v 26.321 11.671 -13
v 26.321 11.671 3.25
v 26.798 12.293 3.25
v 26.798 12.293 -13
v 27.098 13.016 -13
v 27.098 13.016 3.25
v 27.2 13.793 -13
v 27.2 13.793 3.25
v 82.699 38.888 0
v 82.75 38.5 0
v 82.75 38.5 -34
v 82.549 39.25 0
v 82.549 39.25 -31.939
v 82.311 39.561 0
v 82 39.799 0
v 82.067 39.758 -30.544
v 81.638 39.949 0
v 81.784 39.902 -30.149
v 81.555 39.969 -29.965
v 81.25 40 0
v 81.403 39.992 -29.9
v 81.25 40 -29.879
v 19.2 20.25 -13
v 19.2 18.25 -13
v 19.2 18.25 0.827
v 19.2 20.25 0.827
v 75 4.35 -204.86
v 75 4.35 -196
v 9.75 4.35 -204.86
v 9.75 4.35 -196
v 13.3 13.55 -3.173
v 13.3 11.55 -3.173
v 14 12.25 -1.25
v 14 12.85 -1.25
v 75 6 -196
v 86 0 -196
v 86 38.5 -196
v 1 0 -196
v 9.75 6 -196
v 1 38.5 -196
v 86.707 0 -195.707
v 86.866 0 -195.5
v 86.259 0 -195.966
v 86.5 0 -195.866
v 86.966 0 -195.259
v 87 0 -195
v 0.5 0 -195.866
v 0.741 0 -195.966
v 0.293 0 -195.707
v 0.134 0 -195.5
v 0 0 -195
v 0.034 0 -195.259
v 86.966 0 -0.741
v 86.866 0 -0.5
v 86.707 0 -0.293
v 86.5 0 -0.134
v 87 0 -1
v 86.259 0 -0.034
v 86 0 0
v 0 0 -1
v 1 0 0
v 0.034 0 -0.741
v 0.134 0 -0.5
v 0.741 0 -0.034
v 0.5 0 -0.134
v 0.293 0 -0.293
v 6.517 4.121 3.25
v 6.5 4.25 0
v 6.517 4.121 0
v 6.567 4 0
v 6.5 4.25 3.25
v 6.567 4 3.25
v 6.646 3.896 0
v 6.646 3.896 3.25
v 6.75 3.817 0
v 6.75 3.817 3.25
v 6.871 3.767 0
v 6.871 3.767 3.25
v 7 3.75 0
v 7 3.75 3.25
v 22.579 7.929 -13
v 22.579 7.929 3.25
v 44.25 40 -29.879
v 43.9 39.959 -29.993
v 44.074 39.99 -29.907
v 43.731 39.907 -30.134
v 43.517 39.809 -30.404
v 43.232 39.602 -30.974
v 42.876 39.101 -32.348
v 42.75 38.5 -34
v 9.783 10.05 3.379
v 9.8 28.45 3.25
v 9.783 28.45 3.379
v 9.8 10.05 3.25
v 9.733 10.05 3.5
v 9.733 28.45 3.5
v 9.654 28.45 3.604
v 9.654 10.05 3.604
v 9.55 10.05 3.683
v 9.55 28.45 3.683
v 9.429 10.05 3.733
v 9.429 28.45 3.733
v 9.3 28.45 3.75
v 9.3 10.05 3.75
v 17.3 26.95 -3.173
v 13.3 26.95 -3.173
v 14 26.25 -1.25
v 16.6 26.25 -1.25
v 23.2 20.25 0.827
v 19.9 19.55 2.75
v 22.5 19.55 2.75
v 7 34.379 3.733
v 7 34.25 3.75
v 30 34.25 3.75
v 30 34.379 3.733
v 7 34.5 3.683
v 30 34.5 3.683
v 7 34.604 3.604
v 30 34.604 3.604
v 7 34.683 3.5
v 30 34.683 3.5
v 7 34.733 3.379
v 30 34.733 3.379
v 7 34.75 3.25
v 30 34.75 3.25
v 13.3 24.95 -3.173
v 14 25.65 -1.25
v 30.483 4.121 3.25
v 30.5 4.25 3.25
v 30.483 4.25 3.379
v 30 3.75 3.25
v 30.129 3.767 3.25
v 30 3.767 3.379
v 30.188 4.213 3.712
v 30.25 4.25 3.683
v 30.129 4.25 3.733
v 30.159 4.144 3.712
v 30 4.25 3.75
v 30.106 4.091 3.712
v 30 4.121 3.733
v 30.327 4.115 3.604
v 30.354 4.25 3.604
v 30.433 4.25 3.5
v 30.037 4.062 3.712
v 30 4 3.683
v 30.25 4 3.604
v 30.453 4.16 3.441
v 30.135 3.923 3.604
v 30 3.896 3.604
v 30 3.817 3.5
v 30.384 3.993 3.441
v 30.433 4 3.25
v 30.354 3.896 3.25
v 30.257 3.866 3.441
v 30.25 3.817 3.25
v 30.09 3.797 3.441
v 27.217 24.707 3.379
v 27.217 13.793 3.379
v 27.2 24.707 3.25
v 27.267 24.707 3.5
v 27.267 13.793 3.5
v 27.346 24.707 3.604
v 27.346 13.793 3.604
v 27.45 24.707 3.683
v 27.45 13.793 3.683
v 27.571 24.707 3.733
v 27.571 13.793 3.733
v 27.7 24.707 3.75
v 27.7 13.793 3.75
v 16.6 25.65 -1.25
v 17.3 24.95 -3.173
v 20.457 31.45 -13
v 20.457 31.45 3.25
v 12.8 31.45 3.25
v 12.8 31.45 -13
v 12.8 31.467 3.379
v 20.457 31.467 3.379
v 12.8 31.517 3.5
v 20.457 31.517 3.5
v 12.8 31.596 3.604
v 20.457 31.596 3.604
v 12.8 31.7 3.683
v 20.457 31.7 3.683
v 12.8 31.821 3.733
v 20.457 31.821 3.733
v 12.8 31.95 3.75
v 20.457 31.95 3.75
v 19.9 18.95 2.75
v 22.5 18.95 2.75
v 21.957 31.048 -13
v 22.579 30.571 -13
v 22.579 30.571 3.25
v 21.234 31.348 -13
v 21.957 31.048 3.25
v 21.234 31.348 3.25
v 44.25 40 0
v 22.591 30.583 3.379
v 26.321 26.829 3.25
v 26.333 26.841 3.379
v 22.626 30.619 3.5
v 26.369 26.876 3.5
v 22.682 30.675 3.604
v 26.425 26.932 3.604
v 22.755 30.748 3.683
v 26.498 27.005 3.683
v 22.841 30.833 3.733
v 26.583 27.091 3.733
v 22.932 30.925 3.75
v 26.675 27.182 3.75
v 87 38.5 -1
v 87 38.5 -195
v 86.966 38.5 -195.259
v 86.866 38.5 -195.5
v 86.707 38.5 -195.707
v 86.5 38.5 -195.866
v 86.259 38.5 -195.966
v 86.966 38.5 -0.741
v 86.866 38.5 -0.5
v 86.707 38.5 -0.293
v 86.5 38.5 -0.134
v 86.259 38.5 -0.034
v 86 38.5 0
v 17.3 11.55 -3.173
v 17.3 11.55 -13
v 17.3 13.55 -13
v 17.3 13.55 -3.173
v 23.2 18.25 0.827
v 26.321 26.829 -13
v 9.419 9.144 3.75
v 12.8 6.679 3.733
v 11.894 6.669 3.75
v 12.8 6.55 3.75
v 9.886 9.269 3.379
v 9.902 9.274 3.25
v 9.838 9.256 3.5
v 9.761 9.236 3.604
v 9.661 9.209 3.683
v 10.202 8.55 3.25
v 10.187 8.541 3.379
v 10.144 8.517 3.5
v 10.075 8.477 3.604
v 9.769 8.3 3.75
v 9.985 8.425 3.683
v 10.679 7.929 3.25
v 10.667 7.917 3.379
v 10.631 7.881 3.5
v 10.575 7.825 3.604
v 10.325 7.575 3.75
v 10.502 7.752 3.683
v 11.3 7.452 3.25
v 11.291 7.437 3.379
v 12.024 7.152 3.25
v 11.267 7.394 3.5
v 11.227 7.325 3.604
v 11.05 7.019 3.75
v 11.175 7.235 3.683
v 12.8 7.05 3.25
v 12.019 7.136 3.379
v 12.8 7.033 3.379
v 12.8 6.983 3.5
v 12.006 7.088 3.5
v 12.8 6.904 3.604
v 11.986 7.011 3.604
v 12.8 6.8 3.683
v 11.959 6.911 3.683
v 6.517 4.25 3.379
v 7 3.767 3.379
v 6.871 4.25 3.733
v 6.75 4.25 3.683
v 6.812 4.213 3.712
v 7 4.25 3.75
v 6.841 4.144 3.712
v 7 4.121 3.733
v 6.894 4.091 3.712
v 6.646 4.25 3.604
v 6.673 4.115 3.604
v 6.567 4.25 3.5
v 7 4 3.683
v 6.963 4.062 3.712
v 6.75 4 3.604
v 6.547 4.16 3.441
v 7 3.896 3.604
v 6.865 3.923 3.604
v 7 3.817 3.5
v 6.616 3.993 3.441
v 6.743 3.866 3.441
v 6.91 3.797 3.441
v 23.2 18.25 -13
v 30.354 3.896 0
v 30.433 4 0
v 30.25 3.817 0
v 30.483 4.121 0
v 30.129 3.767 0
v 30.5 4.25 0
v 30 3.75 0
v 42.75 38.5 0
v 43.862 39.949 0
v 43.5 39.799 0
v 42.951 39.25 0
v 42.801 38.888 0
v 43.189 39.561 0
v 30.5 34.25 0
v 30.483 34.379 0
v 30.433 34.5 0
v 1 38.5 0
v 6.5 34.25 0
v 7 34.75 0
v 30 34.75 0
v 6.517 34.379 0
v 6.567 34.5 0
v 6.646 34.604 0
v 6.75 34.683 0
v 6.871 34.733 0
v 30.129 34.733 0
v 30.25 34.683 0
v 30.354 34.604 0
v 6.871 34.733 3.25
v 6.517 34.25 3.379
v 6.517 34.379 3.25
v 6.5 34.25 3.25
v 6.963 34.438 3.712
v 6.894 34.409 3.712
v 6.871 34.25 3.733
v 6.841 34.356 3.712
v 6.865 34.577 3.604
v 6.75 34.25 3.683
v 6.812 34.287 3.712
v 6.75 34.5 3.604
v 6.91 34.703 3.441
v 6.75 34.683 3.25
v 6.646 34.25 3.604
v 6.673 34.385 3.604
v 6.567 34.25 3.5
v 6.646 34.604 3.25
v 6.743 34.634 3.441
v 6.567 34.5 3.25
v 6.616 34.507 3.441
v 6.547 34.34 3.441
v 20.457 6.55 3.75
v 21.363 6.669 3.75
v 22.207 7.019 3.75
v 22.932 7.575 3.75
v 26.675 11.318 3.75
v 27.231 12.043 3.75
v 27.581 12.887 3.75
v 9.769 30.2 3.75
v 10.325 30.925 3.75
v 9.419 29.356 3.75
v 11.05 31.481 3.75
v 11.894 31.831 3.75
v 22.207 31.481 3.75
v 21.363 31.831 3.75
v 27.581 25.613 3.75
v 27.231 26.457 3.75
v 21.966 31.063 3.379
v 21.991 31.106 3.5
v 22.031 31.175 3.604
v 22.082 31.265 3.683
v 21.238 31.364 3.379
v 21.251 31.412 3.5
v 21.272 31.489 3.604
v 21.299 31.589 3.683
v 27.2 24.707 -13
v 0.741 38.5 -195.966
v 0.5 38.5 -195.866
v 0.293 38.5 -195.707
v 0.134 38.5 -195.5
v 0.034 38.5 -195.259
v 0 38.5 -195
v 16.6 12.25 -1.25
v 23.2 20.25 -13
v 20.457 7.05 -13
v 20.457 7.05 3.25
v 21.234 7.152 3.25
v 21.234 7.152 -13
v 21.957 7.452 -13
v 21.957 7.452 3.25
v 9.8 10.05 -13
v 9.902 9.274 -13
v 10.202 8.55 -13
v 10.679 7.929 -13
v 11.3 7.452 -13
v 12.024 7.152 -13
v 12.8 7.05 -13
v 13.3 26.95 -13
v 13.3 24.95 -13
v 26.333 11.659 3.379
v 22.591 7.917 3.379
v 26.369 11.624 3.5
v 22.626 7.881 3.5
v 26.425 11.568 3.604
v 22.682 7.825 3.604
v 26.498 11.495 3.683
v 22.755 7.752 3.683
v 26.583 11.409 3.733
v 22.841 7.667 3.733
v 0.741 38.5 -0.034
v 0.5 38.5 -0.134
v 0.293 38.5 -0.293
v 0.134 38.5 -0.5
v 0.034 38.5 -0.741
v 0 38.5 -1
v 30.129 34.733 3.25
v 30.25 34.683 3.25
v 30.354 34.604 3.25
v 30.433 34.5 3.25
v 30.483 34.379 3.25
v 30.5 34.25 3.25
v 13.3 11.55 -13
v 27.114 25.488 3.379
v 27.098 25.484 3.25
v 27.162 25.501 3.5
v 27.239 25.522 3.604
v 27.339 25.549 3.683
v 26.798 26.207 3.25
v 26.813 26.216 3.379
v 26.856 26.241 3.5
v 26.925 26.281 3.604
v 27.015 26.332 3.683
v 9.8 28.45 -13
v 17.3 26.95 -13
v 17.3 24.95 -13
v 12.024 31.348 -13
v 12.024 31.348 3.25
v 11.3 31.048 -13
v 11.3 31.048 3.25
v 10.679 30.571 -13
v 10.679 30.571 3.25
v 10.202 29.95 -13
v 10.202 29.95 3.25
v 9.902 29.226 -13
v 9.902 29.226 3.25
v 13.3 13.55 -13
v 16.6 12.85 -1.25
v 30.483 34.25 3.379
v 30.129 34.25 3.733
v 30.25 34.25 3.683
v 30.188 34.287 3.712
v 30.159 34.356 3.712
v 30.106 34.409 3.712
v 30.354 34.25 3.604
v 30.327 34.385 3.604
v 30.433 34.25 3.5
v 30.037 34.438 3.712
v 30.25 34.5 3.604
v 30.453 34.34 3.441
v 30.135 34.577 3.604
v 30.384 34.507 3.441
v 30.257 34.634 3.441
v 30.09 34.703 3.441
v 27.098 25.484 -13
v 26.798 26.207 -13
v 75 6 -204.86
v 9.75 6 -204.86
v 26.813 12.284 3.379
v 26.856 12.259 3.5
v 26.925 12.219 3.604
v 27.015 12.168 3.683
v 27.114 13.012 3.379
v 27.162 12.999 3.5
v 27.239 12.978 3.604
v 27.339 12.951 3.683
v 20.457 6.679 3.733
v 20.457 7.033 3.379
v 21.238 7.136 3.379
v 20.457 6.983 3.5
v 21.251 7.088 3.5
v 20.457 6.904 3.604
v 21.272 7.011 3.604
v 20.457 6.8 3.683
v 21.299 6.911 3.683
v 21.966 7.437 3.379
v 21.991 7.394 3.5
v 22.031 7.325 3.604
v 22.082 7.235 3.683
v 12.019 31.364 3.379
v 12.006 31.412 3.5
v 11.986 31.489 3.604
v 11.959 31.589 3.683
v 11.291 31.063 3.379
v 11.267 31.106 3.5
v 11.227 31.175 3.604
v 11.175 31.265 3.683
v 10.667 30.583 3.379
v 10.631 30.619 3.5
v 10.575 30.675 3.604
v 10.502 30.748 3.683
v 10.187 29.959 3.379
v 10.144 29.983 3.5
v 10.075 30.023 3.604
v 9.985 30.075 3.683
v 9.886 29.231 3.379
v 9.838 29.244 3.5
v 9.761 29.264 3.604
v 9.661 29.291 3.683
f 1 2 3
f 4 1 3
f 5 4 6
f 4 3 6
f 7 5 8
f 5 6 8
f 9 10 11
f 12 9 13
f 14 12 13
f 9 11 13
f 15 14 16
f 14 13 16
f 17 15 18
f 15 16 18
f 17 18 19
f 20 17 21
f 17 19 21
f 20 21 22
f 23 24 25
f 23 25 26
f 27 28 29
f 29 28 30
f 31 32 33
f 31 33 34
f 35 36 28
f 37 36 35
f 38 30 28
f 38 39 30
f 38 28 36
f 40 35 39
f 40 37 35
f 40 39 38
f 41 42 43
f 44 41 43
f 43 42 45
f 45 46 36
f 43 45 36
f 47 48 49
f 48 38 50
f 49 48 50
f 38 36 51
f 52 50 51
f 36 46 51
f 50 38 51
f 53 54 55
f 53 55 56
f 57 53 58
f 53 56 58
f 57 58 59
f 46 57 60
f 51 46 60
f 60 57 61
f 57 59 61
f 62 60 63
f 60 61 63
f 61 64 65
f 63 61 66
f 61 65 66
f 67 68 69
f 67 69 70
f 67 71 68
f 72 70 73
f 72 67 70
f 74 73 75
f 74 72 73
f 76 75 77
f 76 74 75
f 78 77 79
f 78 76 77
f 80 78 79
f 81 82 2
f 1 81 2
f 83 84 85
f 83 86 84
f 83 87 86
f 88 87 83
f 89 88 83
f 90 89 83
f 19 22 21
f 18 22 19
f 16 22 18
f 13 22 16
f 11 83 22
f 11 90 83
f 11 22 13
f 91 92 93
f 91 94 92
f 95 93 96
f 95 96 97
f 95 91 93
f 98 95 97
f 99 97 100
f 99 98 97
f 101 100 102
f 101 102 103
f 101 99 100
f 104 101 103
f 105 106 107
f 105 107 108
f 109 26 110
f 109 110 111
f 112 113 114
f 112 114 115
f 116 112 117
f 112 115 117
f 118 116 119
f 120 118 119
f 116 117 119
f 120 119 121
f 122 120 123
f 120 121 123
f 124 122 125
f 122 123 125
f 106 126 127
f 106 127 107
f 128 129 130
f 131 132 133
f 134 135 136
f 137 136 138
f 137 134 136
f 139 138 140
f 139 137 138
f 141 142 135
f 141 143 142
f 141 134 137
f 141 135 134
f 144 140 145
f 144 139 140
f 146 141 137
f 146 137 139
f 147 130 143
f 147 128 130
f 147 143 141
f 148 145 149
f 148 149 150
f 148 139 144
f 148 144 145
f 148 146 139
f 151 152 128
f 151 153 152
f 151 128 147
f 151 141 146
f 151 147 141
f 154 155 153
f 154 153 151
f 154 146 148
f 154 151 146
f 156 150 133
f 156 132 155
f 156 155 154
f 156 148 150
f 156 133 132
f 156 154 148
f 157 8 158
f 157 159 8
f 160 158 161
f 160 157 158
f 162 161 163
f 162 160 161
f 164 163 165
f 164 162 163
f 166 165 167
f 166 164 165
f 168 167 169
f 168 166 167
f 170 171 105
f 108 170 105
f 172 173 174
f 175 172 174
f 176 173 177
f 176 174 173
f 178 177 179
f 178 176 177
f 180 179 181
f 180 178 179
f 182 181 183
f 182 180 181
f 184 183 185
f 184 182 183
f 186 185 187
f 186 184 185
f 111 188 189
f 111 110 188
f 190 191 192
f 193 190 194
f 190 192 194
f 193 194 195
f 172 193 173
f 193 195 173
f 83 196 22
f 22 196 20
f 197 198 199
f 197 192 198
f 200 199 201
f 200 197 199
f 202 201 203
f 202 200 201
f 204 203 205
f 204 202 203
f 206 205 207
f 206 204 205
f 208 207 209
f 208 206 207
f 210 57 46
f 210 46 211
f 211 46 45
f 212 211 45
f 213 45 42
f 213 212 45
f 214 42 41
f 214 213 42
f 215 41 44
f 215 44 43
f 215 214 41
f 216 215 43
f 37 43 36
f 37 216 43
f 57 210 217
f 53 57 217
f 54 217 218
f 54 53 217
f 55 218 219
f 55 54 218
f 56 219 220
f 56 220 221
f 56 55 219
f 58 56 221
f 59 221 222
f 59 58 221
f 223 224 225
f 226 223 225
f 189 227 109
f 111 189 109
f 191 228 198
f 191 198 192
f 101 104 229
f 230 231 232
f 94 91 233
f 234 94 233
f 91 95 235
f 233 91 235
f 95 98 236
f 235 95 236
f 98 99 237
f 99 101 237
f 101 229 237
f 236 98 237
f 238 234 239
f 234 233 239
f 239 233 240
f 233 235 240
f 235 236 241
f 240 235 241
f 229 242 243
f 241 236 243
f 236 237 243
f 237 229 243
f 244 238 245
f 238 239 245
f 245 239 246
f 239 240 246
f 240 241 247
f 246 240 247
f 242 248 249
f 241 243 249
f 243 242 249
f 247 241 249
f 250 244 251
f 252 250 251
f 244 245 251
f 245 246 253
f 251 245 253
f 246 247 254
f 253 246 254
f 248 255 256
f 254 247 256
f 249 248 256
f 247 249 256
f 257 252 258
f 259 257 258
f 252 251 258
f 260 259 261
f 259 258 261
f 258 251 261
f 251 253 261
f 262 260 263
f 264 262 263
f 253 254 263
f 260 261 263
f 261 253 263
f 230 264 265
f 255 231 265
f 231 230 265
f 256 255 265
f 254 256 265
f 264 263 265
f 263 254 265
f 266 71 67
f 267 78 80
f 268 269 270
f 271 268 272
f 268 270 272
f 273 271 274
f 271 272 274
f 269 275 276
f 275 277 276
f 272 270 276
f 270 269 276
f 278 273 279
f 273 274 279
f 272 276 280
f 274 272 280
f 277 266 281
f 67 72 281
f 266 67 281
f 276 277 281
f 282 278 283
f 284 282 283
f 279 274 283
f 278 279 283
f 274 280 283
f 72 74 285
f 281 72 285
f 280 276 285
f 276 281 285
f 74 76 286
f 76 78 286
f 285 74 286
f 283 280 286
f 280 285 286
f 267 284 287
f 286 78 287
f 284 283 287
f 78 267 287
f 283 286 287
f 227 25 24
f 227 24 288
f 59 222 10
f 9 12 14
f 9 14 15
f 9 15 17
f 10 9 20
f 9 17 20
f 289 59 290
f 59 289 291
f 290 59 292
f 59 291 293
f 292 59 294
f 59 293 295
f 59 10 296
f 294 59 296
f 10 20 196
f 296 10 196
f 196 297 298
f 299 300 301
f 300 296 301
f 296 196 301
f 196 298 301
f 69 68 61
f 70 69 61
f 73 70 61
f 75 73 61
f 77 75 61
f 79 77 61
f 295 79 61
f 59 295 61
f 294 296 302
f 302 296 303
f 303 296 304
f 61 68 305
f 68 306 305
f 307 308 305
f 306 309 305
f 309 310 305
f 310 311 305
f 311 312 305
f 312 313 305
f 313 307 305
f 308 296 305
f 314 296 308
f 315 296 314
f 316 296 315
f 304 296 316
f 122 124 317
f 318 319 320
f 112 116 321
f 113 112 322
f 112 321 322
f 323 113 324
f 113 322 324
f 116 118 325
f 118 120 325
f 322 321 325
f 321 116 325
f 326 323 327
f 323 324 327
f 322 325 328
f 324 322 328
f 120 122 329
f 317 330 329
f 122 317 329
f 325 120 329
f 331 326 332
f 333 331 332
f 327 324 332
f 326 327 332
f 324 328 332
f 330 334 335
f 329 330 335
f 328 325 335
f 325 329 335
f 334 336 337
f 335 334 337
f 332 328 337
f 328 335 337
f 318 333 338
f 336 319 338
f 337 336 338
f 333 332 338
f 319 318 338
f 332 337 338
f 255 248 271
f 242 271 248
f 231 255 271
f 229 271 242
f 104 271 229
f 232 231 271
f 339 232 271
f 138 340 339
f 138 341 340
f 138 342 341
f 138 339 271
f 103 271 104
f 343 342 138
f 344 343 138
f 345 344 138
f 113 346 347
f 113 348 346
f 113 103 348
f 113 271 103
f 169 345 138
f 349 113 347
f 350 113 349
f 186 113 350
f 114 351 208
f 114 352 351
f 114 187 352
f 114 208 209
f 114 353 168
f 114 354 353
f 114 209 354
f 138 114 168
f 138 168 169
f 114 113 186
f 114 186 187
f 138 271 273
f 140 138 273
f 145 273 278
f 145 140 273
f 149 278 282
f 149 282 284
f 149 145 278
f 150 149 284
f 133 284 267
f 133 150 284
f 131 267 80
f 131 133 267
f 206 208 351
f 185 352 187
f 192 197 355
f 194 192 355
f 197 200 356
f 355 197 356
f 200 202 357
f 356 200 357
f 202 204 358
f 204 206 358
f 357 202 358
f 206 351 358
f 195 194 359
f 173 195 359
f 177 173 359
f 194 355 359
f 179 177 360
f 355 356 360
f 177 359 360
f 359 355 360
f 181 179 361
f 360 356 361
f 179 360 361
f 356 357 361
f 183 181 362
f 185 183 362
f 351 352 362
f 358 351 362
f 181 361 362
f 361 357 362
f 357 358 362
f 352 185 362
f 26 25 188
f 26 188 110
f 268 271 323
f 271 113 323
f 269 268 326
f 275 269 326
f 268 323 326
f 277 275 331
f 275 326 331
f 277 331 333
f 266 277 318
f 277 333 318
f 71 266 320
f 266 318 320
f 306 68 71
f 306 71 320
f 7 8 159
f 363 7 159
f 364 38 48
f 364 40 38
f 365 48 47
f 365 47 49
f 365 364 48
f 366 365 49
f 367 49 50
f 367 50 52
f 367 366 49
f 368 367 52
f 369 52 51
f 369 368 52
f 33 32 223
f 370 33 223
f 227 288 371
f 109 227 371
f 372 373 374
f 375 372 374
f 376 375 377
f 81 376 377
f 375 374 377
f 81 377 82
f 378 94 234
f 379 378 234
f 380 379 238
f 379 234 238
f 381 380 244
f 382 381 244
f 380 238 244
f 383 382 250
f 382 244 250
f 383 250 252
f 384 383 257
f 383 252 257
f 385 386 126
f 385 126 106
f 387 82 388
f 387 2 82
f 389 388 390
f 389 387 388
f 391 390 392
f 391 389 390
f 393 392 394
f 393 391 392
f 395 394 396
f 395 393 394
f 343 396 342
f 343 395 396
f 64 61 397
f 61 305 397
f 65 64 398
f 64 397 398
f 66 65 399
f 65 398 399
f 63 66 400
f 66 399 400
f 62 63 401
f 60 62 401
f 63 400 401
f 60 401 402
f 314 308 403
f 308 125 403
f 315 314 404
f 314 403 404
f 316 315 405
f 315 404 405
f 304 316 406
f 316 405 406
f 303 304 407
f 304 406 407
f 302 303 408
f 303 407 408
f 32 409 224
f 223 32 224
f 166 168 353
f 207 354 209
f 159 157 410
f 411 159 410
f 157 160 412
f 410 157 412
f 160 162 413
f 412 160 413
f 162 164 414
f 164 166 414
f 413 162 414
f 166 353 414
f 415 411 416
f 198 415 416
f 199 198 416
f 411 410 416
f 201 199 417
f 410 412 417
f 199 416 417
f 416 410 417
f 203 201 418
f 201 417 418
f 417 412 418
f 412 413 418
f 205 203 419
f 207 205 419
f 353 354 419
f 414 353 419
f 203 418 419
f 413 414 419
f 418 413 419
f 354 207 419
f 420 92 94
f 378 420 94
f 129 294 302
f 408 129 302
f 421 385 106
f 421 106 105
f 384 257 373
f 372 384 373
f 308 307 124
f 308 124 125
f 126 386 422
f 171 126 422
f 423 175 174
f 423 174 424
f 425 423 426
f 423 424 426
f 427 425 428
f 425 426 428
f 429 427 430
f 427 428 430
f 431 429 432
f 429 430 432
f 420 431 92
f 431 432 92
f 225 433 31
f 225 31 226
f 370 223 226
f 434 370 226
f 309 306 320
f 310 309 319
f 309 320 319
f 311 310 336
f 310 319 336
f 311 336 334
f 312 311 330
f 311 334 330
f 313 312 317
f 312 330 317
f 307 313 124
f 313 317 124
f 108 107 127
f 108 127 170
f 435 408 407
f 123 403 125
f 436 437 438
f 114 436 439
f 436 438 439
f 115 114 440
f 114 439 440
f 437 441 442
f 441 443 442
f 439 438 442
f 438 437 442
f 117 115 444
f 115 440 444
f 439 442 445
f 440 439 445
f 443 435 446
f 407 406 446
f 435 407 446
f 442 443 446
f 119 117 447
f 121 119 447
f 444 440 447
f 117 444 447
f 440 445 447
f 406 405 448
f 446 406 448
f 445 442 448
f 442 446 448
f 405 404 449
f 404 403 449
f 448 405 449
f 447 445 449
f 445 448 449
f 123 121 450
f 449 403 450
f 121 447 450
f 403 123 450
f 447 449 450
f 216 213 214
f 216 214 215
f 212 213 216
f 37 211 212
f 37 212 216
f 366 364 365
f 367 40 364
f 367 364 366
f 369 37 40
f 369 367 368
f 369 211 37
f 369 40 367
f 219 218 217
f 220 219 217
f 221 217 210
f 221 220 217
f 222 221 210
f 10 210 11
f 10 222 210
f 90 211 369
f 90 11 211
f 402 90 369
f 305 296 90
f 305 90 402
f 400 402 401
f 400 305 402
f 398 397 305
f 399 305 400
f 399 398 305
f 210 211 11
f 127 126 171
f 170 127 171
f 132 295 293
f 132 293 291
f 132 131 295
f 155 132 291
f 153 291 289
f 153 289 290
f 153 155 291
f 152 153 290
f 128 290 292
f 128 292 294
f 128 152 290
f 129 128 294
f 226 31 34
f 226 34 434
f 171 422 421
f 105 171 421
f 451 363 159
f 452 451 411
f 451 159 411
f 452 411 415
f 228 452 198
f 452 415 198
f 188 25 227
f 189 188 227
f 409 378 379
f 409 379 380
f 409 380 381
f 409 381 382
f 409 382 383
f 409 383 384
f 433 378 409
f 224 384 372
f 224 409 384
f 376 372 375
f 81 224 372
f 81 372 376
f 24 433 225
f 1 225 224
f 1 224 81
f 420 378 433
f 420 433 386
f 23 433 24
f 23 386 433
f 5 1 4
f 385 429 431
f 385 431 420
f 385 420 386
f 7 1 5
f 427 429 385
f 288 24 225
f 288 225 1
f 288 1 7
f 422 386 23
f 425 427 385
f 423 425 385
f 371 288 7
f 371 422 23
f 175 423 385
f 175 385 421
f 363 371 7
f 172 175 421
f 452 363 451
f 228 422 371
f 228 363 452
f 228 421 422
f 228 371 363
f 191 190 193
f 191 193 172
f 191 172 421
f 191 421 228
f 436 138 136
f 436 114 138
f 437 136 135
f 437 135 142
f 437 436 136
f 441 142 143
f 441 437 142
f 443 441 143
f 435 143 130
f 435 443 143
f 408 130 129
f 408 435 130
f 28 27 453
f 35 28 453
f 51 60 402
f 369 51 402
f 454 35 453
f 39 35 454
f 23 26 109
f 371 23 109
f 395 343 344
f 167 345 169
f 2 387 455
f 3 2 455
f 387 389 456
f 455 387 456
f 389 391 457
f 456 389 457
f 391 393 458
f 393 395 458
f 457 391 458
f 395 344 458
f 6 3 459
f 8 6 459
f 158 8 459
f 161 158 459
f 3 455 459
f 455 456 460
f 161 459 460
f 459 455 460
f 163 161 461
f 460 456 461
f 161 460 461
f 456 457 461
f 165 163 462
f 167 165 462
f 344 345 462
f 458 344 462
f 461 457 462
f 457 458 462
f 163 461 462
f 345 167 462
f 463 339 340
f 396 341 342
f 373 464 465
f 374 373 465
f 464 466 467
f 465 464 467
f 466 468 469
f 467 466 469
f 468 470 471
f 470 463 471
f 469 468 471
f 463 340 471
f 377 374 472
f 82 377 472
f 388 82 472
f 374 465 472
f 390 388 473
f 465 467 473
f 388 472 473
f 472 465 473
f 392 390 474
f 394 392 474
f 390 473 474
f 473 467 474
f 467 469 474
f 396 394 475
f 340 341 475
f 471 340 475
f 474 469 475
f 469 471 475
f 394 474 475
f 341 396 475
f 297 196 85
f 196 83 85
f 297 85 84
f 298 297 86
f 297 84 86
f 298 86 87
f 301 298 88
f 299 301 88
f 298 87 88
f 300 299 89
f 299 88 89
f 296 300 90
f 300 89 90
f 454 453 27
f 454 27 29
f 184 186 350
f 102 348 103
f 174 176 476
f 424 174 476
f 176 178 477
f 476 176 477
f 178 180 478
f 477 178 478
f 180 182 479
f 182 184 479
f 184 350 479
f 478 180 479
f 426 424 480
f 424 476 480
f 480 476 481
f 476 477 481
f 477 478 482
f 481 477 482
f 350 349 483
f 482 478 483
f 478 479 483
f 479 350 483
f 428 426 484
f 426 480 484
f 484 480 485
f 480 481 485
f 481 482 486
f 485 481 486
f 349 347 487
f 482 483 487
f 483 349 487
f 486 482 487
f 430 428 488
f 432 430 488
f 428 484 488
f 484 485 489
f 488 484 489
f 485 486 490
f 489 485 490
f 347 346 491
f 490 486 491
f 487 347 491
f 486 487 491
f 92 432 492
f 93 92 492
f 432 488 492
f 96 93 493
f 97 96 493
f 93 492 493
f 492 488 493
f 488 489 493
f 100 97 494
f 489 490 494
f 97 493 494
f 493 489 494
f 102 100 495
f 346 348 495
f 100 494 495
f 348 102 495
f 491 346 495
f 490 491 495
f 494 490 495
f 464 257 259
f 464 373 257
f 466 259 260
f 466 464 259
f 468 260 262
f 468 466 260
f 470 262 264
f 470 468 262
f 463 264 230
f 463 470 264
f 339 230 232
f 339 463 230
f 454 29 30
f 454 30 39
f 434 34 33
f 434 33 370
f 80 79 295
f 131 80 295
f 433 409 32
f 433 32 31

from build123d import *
from OCP.BRepFilletAPI import BRepFilletAPI_MakeChamfer

# Parameters (mm, degrees)
BOSS_EXTRUDE1_DEPTH = 34
SKETCH2_W           = 87
SKETCH2_H           = 38.5
BOSS_EXTRUDE2_DEPTH = 162
SKETCH3_W           = 65.25
SKETCH3_H           = 1.65
BOSS_EXTRUDE3_DEPTH = 8.86
FILLET1_R           = 1
CHAMFER1_SIZE2      = 1.5
CHAMFER1_SIZE       = 4.121216129
FILLET2_R           = 1.5
SKETCH4_W           = 24
SKETCH4_H           = 31
BOSS_EXTRUDE4_DEPTH = 3.75
CUT_EXTRUDE1_DEPTH  = 16.75
SKETCH6_W           = 4
SKETCH6_H           = 2
BOSS_EXTRUDE5_DEPTH = 11.75
SKETCH7_W           = 4
SKETCH7_H           = 2
BOSS_EXTRUDE6_DEPTH = 15.75
CHAMFER2_SIZE       = 0.7
CHAMFER2_SIZE2      = 1.923234194
FILLET3_R           = 0.5


with BuildPart() as part:
    # Sketch1 → Boss-Extrude1 (new body)
    with BuildSketch(Plane.XY):
        Polygon((42.75, 40), (82.75, 40), (82.75, 38.5), (87, 38.5), (87, 0), (0, 0), (0, 38.5), (42.75, 38.5), align=None)
    extrude(amount=-BOSS_EXTRUDE1_DEPTH)

    # Sketch2 → Boss-Extrude2 (add)
    with BuildSketch(Plane(origin=(0, 0, -34), x_dir=(-1, 0, 0), z_dir=(0, 0, -1))):
        with Locations((-43.5, 19.25)):
            Rectangle(SKETCH2_W, SKETCH2_H)
    extrude(amount=BOSS_EXTRUDE2_DEPTH)

    # Sketch3 → Boss-Extrude3 (add)
    with BuildSketch(Plane(origin=(0, 0, -196), x_dir=(-1, 0, 0), z_dir=(0, 0, -1))):
        with Locations((-42.375, 5.175)):
            Rectangle(SKETCH3_W, SKETCH3_H)
    extrude(amount=BOSS_EXTRUDE3_DEPTH)

    # Fillet1
    fillet1_edges = [part.edges().sort_by_distance(p)[0] for p in [
        (87, 19.25, 0),
        (0, 19.25, 0),
        (0, 19.25, -196),
        (87, 19.25, -196),
    ]]
    fillet(fillet1_edges, radius=FILLET1_R)

    # Chamfer1
    chamfer1_edges = [part.edges().sort_by_distance(p)[0] for p in [
        (62.75, 40, -34),
    ]]
    chamfer1_side = [part.faces().sort_by_distance(p)[0] for p in [
        (62.75, 40, -33.97),
    ]]
    chamfer(chamfer1_edges, length=CHAMFER1_SIZE - 0.0001, length2=CHAMFER1_SIZE2 - 0.0001, reference=chamfer1_side[0])  # a hair under: the kernel refuses the full size

    # Fillet2
    fillet2_edges = [part.edges().sort_by_distance(p)[0] for p in [
        (42.75, 40, -14.939441935),
        (82.75, 40, -14.939441935),
    ]]
    fillet(fillet2_edges, radius=FILLET2_R - 0.0001)  # a hair under: the kernel refuses the full size

    # Sketch4 → Boss-Extrude4 (add)
    with BuildSketch(Plane.XY):
        with Locations((18.5, 19.25)):
            Rectangle(SKETCH4_W, SKETCH4_H)
    extrude(amount=BOSS_EXTRUDE4_DEPTH)

    # Sketch5 → Cut-Extrude1 (cut)
    with BuildSketch(Plane.XY.offset(3.75)):
        with BuildLine():
            Line((27.2, 13.792640687), (27.2, 24.707359313))
            ThreePointArc((27.2, 24.707359313), (26.971638598, 25.85540961), (26.321320344, 26.828679656))
            Line((26.321320344, 26.828679656), (22.578679656, 30.571320344))
            ThreePointArc((22.578679656, 30.571320344), (21.60540961, 31.221638598), (20.457359313, 31.45))
            Line((20.457359313, 31.45), (12.8, 31.45))
            ThreePointArc((12.8, 31.45), (10.678679656, 30.571320344), (9.8, 28.45))
            Line((9.8, 28.45), (9.8, 10.05))
            ThreePointArc((9.8, 10.05), (10.678679656, 7.928679656), (12.8, 7.05))
            Line((12.8, 7.05), (20.457359313, 7.05))
            ThreePointArc((20.457359313, 7.05), (21.60540961, 7.278361402), (22.578679656, 7.928679656))
            Line((22.578679656, 7.928679656), (26.321320344, 11.671320344))
            ThreePointArc((26.321320344, 11.671320344), (26.971638598, 12.64459039), (27.2, 13.792640687))
        make_face()
    extrude(amount=-CUT_EXTRUDE1_DEPTH, mode=Mode.SUBTRACT)

    # Sketch6 → Boss-Extrude5 (add)
    with BuildSketch(Plane.XY.offset(-13)):
        with Locations((15.3, 25.95)):
            Rectangle(SKETCH6_W, SKETCH6_H)
        with Locations((15.3, 12.55)):
            Rectangle(SKETCH6_W, SKETCH6_H)
    extrude(amount=BOSS_EXTRUDE5_DEPTH)

    # Sketch7 → Boss-Extrude6 (add)
    with BuildSketch(Plane.XY.offset(-13)):
        with Locations((21.2, 19.25)):
            Rectangle(SKETCH7_W, SKETCH7_H)
    extrude(amount=BOSS_EXTRUDE6_DEPTH)

    # Chamfer2: one chamfer whose edges measure the first distance from different faces: ONE call of the kernel's chamfer builder (chamfer() names one face for all edges)
    chamfer2_edges_1 = [part.edges().sort_by_distance(p)[0] for p in [
        (17.3, 25.95, -1.25),
        (15.3, 26.95, -1.25),
        (13.3, 25.95, -1.25),
        (15.3, 24.95, -1.25),
    ]]
    chamfer2_side_1 = [part.faces().sort_by_distance(p)[0] for p in [
        (15.3, 25.95, -1.25),
    ]]
    chamfer2_edges_2 = [part.edges().sort_by_distance(p)[0] for p in [
        (17.3, 12.55, -1.25),
        (15.3, 13.55, -1.25),
        (13.3, 12.55, -1.25),
        (15.3, 11.55, -1.25),
    ]]
    chamfer2_side_2 = [part.faces().sort_by_distance(p)[0] for p in [
        (15.3, 12.55, -1.25),
    ]]
    chamfer2_edges_3 = [part.edges().sort_by_distance(p)[0] for p in [
        (21.2, 18.25, 2.75),
        (23.2, 19.25, 2.75),
        (21.2, 20.25, 2.75),
        (19.2, 19.25, 2.75),
    ]]
    chamfer2_side_3 = [part.faces().sort_by_distance(p)[0] for p in [
        (21.2, 19.25, 2.75),
    ]]
    chamfer2 = BRepFilletAPI_MakeChamfer(part.part.solid().wrapped)
    for e in chamfer2_edges_1:
        chamfer2.Add(CHAMFER2_SIZE, CHAMFER2_SIZE2, e.wrapped, chamfer2_side_1[0].wrapped)  # the first distance lies on this face
    for e in chamfer2_edges_2:
        chamfer2.Add(CHAMFER2_SIZE, CHAMFER2_SIZE2, e.wrapped, chamfer2_side_2[0].wrapped)  # the first distance lies on this face
    for e in chamfer2_edges_3:
        chamfer2.Add(CHAMFER2_SIZE, CHAMFER2_SIZE2, e.wrapped, chamfer2_side_3[0].wrapped)  # the first distance lies on this face
    add(Compound.cast(chamfer2.Shape()), mode=Mode.REPLACE)

    # Fillet3
    fillet3_edges = [part.edges().sort_by_distance(p)[0] for p in [
        (30.5, 3.75, 1.875),
        (30.5, 34.75, 1.875),
        (6.5, 34.75, 1.875),
        (6.5, 3.75, 1.875),
        (30.5, 19.25, 3.75),
        (18.5, 34.75, 3.75),
        (6.5, 19.25, 3.75),
        (18.5, 3.75, 3.75),
        (10.678679656, 7.928679656, 3.75),
        (16.628679656, 7.05, 3.75),
        (21.60540961, 7.278361402, 3.75),
        (24.45, 9.8, 3.75),
        (26.971638598, 12.64459039, 3.75),
        (27.2, 19.25, 3.75),
        (26.971638598, 25.85540961, 3.75),
        (24.45, 28.7, 3.75),
        (21.60540961, 31.221638598, 3.75),
        (16.628679656, 31.45, 3.75),
        (10.678679656, 30.571320344, 3.75),
        (9.8, 19.25, 3.75),
    ]]
    fillet(fillet3_edges, radius=FILLET3_R)


solid = part.part
